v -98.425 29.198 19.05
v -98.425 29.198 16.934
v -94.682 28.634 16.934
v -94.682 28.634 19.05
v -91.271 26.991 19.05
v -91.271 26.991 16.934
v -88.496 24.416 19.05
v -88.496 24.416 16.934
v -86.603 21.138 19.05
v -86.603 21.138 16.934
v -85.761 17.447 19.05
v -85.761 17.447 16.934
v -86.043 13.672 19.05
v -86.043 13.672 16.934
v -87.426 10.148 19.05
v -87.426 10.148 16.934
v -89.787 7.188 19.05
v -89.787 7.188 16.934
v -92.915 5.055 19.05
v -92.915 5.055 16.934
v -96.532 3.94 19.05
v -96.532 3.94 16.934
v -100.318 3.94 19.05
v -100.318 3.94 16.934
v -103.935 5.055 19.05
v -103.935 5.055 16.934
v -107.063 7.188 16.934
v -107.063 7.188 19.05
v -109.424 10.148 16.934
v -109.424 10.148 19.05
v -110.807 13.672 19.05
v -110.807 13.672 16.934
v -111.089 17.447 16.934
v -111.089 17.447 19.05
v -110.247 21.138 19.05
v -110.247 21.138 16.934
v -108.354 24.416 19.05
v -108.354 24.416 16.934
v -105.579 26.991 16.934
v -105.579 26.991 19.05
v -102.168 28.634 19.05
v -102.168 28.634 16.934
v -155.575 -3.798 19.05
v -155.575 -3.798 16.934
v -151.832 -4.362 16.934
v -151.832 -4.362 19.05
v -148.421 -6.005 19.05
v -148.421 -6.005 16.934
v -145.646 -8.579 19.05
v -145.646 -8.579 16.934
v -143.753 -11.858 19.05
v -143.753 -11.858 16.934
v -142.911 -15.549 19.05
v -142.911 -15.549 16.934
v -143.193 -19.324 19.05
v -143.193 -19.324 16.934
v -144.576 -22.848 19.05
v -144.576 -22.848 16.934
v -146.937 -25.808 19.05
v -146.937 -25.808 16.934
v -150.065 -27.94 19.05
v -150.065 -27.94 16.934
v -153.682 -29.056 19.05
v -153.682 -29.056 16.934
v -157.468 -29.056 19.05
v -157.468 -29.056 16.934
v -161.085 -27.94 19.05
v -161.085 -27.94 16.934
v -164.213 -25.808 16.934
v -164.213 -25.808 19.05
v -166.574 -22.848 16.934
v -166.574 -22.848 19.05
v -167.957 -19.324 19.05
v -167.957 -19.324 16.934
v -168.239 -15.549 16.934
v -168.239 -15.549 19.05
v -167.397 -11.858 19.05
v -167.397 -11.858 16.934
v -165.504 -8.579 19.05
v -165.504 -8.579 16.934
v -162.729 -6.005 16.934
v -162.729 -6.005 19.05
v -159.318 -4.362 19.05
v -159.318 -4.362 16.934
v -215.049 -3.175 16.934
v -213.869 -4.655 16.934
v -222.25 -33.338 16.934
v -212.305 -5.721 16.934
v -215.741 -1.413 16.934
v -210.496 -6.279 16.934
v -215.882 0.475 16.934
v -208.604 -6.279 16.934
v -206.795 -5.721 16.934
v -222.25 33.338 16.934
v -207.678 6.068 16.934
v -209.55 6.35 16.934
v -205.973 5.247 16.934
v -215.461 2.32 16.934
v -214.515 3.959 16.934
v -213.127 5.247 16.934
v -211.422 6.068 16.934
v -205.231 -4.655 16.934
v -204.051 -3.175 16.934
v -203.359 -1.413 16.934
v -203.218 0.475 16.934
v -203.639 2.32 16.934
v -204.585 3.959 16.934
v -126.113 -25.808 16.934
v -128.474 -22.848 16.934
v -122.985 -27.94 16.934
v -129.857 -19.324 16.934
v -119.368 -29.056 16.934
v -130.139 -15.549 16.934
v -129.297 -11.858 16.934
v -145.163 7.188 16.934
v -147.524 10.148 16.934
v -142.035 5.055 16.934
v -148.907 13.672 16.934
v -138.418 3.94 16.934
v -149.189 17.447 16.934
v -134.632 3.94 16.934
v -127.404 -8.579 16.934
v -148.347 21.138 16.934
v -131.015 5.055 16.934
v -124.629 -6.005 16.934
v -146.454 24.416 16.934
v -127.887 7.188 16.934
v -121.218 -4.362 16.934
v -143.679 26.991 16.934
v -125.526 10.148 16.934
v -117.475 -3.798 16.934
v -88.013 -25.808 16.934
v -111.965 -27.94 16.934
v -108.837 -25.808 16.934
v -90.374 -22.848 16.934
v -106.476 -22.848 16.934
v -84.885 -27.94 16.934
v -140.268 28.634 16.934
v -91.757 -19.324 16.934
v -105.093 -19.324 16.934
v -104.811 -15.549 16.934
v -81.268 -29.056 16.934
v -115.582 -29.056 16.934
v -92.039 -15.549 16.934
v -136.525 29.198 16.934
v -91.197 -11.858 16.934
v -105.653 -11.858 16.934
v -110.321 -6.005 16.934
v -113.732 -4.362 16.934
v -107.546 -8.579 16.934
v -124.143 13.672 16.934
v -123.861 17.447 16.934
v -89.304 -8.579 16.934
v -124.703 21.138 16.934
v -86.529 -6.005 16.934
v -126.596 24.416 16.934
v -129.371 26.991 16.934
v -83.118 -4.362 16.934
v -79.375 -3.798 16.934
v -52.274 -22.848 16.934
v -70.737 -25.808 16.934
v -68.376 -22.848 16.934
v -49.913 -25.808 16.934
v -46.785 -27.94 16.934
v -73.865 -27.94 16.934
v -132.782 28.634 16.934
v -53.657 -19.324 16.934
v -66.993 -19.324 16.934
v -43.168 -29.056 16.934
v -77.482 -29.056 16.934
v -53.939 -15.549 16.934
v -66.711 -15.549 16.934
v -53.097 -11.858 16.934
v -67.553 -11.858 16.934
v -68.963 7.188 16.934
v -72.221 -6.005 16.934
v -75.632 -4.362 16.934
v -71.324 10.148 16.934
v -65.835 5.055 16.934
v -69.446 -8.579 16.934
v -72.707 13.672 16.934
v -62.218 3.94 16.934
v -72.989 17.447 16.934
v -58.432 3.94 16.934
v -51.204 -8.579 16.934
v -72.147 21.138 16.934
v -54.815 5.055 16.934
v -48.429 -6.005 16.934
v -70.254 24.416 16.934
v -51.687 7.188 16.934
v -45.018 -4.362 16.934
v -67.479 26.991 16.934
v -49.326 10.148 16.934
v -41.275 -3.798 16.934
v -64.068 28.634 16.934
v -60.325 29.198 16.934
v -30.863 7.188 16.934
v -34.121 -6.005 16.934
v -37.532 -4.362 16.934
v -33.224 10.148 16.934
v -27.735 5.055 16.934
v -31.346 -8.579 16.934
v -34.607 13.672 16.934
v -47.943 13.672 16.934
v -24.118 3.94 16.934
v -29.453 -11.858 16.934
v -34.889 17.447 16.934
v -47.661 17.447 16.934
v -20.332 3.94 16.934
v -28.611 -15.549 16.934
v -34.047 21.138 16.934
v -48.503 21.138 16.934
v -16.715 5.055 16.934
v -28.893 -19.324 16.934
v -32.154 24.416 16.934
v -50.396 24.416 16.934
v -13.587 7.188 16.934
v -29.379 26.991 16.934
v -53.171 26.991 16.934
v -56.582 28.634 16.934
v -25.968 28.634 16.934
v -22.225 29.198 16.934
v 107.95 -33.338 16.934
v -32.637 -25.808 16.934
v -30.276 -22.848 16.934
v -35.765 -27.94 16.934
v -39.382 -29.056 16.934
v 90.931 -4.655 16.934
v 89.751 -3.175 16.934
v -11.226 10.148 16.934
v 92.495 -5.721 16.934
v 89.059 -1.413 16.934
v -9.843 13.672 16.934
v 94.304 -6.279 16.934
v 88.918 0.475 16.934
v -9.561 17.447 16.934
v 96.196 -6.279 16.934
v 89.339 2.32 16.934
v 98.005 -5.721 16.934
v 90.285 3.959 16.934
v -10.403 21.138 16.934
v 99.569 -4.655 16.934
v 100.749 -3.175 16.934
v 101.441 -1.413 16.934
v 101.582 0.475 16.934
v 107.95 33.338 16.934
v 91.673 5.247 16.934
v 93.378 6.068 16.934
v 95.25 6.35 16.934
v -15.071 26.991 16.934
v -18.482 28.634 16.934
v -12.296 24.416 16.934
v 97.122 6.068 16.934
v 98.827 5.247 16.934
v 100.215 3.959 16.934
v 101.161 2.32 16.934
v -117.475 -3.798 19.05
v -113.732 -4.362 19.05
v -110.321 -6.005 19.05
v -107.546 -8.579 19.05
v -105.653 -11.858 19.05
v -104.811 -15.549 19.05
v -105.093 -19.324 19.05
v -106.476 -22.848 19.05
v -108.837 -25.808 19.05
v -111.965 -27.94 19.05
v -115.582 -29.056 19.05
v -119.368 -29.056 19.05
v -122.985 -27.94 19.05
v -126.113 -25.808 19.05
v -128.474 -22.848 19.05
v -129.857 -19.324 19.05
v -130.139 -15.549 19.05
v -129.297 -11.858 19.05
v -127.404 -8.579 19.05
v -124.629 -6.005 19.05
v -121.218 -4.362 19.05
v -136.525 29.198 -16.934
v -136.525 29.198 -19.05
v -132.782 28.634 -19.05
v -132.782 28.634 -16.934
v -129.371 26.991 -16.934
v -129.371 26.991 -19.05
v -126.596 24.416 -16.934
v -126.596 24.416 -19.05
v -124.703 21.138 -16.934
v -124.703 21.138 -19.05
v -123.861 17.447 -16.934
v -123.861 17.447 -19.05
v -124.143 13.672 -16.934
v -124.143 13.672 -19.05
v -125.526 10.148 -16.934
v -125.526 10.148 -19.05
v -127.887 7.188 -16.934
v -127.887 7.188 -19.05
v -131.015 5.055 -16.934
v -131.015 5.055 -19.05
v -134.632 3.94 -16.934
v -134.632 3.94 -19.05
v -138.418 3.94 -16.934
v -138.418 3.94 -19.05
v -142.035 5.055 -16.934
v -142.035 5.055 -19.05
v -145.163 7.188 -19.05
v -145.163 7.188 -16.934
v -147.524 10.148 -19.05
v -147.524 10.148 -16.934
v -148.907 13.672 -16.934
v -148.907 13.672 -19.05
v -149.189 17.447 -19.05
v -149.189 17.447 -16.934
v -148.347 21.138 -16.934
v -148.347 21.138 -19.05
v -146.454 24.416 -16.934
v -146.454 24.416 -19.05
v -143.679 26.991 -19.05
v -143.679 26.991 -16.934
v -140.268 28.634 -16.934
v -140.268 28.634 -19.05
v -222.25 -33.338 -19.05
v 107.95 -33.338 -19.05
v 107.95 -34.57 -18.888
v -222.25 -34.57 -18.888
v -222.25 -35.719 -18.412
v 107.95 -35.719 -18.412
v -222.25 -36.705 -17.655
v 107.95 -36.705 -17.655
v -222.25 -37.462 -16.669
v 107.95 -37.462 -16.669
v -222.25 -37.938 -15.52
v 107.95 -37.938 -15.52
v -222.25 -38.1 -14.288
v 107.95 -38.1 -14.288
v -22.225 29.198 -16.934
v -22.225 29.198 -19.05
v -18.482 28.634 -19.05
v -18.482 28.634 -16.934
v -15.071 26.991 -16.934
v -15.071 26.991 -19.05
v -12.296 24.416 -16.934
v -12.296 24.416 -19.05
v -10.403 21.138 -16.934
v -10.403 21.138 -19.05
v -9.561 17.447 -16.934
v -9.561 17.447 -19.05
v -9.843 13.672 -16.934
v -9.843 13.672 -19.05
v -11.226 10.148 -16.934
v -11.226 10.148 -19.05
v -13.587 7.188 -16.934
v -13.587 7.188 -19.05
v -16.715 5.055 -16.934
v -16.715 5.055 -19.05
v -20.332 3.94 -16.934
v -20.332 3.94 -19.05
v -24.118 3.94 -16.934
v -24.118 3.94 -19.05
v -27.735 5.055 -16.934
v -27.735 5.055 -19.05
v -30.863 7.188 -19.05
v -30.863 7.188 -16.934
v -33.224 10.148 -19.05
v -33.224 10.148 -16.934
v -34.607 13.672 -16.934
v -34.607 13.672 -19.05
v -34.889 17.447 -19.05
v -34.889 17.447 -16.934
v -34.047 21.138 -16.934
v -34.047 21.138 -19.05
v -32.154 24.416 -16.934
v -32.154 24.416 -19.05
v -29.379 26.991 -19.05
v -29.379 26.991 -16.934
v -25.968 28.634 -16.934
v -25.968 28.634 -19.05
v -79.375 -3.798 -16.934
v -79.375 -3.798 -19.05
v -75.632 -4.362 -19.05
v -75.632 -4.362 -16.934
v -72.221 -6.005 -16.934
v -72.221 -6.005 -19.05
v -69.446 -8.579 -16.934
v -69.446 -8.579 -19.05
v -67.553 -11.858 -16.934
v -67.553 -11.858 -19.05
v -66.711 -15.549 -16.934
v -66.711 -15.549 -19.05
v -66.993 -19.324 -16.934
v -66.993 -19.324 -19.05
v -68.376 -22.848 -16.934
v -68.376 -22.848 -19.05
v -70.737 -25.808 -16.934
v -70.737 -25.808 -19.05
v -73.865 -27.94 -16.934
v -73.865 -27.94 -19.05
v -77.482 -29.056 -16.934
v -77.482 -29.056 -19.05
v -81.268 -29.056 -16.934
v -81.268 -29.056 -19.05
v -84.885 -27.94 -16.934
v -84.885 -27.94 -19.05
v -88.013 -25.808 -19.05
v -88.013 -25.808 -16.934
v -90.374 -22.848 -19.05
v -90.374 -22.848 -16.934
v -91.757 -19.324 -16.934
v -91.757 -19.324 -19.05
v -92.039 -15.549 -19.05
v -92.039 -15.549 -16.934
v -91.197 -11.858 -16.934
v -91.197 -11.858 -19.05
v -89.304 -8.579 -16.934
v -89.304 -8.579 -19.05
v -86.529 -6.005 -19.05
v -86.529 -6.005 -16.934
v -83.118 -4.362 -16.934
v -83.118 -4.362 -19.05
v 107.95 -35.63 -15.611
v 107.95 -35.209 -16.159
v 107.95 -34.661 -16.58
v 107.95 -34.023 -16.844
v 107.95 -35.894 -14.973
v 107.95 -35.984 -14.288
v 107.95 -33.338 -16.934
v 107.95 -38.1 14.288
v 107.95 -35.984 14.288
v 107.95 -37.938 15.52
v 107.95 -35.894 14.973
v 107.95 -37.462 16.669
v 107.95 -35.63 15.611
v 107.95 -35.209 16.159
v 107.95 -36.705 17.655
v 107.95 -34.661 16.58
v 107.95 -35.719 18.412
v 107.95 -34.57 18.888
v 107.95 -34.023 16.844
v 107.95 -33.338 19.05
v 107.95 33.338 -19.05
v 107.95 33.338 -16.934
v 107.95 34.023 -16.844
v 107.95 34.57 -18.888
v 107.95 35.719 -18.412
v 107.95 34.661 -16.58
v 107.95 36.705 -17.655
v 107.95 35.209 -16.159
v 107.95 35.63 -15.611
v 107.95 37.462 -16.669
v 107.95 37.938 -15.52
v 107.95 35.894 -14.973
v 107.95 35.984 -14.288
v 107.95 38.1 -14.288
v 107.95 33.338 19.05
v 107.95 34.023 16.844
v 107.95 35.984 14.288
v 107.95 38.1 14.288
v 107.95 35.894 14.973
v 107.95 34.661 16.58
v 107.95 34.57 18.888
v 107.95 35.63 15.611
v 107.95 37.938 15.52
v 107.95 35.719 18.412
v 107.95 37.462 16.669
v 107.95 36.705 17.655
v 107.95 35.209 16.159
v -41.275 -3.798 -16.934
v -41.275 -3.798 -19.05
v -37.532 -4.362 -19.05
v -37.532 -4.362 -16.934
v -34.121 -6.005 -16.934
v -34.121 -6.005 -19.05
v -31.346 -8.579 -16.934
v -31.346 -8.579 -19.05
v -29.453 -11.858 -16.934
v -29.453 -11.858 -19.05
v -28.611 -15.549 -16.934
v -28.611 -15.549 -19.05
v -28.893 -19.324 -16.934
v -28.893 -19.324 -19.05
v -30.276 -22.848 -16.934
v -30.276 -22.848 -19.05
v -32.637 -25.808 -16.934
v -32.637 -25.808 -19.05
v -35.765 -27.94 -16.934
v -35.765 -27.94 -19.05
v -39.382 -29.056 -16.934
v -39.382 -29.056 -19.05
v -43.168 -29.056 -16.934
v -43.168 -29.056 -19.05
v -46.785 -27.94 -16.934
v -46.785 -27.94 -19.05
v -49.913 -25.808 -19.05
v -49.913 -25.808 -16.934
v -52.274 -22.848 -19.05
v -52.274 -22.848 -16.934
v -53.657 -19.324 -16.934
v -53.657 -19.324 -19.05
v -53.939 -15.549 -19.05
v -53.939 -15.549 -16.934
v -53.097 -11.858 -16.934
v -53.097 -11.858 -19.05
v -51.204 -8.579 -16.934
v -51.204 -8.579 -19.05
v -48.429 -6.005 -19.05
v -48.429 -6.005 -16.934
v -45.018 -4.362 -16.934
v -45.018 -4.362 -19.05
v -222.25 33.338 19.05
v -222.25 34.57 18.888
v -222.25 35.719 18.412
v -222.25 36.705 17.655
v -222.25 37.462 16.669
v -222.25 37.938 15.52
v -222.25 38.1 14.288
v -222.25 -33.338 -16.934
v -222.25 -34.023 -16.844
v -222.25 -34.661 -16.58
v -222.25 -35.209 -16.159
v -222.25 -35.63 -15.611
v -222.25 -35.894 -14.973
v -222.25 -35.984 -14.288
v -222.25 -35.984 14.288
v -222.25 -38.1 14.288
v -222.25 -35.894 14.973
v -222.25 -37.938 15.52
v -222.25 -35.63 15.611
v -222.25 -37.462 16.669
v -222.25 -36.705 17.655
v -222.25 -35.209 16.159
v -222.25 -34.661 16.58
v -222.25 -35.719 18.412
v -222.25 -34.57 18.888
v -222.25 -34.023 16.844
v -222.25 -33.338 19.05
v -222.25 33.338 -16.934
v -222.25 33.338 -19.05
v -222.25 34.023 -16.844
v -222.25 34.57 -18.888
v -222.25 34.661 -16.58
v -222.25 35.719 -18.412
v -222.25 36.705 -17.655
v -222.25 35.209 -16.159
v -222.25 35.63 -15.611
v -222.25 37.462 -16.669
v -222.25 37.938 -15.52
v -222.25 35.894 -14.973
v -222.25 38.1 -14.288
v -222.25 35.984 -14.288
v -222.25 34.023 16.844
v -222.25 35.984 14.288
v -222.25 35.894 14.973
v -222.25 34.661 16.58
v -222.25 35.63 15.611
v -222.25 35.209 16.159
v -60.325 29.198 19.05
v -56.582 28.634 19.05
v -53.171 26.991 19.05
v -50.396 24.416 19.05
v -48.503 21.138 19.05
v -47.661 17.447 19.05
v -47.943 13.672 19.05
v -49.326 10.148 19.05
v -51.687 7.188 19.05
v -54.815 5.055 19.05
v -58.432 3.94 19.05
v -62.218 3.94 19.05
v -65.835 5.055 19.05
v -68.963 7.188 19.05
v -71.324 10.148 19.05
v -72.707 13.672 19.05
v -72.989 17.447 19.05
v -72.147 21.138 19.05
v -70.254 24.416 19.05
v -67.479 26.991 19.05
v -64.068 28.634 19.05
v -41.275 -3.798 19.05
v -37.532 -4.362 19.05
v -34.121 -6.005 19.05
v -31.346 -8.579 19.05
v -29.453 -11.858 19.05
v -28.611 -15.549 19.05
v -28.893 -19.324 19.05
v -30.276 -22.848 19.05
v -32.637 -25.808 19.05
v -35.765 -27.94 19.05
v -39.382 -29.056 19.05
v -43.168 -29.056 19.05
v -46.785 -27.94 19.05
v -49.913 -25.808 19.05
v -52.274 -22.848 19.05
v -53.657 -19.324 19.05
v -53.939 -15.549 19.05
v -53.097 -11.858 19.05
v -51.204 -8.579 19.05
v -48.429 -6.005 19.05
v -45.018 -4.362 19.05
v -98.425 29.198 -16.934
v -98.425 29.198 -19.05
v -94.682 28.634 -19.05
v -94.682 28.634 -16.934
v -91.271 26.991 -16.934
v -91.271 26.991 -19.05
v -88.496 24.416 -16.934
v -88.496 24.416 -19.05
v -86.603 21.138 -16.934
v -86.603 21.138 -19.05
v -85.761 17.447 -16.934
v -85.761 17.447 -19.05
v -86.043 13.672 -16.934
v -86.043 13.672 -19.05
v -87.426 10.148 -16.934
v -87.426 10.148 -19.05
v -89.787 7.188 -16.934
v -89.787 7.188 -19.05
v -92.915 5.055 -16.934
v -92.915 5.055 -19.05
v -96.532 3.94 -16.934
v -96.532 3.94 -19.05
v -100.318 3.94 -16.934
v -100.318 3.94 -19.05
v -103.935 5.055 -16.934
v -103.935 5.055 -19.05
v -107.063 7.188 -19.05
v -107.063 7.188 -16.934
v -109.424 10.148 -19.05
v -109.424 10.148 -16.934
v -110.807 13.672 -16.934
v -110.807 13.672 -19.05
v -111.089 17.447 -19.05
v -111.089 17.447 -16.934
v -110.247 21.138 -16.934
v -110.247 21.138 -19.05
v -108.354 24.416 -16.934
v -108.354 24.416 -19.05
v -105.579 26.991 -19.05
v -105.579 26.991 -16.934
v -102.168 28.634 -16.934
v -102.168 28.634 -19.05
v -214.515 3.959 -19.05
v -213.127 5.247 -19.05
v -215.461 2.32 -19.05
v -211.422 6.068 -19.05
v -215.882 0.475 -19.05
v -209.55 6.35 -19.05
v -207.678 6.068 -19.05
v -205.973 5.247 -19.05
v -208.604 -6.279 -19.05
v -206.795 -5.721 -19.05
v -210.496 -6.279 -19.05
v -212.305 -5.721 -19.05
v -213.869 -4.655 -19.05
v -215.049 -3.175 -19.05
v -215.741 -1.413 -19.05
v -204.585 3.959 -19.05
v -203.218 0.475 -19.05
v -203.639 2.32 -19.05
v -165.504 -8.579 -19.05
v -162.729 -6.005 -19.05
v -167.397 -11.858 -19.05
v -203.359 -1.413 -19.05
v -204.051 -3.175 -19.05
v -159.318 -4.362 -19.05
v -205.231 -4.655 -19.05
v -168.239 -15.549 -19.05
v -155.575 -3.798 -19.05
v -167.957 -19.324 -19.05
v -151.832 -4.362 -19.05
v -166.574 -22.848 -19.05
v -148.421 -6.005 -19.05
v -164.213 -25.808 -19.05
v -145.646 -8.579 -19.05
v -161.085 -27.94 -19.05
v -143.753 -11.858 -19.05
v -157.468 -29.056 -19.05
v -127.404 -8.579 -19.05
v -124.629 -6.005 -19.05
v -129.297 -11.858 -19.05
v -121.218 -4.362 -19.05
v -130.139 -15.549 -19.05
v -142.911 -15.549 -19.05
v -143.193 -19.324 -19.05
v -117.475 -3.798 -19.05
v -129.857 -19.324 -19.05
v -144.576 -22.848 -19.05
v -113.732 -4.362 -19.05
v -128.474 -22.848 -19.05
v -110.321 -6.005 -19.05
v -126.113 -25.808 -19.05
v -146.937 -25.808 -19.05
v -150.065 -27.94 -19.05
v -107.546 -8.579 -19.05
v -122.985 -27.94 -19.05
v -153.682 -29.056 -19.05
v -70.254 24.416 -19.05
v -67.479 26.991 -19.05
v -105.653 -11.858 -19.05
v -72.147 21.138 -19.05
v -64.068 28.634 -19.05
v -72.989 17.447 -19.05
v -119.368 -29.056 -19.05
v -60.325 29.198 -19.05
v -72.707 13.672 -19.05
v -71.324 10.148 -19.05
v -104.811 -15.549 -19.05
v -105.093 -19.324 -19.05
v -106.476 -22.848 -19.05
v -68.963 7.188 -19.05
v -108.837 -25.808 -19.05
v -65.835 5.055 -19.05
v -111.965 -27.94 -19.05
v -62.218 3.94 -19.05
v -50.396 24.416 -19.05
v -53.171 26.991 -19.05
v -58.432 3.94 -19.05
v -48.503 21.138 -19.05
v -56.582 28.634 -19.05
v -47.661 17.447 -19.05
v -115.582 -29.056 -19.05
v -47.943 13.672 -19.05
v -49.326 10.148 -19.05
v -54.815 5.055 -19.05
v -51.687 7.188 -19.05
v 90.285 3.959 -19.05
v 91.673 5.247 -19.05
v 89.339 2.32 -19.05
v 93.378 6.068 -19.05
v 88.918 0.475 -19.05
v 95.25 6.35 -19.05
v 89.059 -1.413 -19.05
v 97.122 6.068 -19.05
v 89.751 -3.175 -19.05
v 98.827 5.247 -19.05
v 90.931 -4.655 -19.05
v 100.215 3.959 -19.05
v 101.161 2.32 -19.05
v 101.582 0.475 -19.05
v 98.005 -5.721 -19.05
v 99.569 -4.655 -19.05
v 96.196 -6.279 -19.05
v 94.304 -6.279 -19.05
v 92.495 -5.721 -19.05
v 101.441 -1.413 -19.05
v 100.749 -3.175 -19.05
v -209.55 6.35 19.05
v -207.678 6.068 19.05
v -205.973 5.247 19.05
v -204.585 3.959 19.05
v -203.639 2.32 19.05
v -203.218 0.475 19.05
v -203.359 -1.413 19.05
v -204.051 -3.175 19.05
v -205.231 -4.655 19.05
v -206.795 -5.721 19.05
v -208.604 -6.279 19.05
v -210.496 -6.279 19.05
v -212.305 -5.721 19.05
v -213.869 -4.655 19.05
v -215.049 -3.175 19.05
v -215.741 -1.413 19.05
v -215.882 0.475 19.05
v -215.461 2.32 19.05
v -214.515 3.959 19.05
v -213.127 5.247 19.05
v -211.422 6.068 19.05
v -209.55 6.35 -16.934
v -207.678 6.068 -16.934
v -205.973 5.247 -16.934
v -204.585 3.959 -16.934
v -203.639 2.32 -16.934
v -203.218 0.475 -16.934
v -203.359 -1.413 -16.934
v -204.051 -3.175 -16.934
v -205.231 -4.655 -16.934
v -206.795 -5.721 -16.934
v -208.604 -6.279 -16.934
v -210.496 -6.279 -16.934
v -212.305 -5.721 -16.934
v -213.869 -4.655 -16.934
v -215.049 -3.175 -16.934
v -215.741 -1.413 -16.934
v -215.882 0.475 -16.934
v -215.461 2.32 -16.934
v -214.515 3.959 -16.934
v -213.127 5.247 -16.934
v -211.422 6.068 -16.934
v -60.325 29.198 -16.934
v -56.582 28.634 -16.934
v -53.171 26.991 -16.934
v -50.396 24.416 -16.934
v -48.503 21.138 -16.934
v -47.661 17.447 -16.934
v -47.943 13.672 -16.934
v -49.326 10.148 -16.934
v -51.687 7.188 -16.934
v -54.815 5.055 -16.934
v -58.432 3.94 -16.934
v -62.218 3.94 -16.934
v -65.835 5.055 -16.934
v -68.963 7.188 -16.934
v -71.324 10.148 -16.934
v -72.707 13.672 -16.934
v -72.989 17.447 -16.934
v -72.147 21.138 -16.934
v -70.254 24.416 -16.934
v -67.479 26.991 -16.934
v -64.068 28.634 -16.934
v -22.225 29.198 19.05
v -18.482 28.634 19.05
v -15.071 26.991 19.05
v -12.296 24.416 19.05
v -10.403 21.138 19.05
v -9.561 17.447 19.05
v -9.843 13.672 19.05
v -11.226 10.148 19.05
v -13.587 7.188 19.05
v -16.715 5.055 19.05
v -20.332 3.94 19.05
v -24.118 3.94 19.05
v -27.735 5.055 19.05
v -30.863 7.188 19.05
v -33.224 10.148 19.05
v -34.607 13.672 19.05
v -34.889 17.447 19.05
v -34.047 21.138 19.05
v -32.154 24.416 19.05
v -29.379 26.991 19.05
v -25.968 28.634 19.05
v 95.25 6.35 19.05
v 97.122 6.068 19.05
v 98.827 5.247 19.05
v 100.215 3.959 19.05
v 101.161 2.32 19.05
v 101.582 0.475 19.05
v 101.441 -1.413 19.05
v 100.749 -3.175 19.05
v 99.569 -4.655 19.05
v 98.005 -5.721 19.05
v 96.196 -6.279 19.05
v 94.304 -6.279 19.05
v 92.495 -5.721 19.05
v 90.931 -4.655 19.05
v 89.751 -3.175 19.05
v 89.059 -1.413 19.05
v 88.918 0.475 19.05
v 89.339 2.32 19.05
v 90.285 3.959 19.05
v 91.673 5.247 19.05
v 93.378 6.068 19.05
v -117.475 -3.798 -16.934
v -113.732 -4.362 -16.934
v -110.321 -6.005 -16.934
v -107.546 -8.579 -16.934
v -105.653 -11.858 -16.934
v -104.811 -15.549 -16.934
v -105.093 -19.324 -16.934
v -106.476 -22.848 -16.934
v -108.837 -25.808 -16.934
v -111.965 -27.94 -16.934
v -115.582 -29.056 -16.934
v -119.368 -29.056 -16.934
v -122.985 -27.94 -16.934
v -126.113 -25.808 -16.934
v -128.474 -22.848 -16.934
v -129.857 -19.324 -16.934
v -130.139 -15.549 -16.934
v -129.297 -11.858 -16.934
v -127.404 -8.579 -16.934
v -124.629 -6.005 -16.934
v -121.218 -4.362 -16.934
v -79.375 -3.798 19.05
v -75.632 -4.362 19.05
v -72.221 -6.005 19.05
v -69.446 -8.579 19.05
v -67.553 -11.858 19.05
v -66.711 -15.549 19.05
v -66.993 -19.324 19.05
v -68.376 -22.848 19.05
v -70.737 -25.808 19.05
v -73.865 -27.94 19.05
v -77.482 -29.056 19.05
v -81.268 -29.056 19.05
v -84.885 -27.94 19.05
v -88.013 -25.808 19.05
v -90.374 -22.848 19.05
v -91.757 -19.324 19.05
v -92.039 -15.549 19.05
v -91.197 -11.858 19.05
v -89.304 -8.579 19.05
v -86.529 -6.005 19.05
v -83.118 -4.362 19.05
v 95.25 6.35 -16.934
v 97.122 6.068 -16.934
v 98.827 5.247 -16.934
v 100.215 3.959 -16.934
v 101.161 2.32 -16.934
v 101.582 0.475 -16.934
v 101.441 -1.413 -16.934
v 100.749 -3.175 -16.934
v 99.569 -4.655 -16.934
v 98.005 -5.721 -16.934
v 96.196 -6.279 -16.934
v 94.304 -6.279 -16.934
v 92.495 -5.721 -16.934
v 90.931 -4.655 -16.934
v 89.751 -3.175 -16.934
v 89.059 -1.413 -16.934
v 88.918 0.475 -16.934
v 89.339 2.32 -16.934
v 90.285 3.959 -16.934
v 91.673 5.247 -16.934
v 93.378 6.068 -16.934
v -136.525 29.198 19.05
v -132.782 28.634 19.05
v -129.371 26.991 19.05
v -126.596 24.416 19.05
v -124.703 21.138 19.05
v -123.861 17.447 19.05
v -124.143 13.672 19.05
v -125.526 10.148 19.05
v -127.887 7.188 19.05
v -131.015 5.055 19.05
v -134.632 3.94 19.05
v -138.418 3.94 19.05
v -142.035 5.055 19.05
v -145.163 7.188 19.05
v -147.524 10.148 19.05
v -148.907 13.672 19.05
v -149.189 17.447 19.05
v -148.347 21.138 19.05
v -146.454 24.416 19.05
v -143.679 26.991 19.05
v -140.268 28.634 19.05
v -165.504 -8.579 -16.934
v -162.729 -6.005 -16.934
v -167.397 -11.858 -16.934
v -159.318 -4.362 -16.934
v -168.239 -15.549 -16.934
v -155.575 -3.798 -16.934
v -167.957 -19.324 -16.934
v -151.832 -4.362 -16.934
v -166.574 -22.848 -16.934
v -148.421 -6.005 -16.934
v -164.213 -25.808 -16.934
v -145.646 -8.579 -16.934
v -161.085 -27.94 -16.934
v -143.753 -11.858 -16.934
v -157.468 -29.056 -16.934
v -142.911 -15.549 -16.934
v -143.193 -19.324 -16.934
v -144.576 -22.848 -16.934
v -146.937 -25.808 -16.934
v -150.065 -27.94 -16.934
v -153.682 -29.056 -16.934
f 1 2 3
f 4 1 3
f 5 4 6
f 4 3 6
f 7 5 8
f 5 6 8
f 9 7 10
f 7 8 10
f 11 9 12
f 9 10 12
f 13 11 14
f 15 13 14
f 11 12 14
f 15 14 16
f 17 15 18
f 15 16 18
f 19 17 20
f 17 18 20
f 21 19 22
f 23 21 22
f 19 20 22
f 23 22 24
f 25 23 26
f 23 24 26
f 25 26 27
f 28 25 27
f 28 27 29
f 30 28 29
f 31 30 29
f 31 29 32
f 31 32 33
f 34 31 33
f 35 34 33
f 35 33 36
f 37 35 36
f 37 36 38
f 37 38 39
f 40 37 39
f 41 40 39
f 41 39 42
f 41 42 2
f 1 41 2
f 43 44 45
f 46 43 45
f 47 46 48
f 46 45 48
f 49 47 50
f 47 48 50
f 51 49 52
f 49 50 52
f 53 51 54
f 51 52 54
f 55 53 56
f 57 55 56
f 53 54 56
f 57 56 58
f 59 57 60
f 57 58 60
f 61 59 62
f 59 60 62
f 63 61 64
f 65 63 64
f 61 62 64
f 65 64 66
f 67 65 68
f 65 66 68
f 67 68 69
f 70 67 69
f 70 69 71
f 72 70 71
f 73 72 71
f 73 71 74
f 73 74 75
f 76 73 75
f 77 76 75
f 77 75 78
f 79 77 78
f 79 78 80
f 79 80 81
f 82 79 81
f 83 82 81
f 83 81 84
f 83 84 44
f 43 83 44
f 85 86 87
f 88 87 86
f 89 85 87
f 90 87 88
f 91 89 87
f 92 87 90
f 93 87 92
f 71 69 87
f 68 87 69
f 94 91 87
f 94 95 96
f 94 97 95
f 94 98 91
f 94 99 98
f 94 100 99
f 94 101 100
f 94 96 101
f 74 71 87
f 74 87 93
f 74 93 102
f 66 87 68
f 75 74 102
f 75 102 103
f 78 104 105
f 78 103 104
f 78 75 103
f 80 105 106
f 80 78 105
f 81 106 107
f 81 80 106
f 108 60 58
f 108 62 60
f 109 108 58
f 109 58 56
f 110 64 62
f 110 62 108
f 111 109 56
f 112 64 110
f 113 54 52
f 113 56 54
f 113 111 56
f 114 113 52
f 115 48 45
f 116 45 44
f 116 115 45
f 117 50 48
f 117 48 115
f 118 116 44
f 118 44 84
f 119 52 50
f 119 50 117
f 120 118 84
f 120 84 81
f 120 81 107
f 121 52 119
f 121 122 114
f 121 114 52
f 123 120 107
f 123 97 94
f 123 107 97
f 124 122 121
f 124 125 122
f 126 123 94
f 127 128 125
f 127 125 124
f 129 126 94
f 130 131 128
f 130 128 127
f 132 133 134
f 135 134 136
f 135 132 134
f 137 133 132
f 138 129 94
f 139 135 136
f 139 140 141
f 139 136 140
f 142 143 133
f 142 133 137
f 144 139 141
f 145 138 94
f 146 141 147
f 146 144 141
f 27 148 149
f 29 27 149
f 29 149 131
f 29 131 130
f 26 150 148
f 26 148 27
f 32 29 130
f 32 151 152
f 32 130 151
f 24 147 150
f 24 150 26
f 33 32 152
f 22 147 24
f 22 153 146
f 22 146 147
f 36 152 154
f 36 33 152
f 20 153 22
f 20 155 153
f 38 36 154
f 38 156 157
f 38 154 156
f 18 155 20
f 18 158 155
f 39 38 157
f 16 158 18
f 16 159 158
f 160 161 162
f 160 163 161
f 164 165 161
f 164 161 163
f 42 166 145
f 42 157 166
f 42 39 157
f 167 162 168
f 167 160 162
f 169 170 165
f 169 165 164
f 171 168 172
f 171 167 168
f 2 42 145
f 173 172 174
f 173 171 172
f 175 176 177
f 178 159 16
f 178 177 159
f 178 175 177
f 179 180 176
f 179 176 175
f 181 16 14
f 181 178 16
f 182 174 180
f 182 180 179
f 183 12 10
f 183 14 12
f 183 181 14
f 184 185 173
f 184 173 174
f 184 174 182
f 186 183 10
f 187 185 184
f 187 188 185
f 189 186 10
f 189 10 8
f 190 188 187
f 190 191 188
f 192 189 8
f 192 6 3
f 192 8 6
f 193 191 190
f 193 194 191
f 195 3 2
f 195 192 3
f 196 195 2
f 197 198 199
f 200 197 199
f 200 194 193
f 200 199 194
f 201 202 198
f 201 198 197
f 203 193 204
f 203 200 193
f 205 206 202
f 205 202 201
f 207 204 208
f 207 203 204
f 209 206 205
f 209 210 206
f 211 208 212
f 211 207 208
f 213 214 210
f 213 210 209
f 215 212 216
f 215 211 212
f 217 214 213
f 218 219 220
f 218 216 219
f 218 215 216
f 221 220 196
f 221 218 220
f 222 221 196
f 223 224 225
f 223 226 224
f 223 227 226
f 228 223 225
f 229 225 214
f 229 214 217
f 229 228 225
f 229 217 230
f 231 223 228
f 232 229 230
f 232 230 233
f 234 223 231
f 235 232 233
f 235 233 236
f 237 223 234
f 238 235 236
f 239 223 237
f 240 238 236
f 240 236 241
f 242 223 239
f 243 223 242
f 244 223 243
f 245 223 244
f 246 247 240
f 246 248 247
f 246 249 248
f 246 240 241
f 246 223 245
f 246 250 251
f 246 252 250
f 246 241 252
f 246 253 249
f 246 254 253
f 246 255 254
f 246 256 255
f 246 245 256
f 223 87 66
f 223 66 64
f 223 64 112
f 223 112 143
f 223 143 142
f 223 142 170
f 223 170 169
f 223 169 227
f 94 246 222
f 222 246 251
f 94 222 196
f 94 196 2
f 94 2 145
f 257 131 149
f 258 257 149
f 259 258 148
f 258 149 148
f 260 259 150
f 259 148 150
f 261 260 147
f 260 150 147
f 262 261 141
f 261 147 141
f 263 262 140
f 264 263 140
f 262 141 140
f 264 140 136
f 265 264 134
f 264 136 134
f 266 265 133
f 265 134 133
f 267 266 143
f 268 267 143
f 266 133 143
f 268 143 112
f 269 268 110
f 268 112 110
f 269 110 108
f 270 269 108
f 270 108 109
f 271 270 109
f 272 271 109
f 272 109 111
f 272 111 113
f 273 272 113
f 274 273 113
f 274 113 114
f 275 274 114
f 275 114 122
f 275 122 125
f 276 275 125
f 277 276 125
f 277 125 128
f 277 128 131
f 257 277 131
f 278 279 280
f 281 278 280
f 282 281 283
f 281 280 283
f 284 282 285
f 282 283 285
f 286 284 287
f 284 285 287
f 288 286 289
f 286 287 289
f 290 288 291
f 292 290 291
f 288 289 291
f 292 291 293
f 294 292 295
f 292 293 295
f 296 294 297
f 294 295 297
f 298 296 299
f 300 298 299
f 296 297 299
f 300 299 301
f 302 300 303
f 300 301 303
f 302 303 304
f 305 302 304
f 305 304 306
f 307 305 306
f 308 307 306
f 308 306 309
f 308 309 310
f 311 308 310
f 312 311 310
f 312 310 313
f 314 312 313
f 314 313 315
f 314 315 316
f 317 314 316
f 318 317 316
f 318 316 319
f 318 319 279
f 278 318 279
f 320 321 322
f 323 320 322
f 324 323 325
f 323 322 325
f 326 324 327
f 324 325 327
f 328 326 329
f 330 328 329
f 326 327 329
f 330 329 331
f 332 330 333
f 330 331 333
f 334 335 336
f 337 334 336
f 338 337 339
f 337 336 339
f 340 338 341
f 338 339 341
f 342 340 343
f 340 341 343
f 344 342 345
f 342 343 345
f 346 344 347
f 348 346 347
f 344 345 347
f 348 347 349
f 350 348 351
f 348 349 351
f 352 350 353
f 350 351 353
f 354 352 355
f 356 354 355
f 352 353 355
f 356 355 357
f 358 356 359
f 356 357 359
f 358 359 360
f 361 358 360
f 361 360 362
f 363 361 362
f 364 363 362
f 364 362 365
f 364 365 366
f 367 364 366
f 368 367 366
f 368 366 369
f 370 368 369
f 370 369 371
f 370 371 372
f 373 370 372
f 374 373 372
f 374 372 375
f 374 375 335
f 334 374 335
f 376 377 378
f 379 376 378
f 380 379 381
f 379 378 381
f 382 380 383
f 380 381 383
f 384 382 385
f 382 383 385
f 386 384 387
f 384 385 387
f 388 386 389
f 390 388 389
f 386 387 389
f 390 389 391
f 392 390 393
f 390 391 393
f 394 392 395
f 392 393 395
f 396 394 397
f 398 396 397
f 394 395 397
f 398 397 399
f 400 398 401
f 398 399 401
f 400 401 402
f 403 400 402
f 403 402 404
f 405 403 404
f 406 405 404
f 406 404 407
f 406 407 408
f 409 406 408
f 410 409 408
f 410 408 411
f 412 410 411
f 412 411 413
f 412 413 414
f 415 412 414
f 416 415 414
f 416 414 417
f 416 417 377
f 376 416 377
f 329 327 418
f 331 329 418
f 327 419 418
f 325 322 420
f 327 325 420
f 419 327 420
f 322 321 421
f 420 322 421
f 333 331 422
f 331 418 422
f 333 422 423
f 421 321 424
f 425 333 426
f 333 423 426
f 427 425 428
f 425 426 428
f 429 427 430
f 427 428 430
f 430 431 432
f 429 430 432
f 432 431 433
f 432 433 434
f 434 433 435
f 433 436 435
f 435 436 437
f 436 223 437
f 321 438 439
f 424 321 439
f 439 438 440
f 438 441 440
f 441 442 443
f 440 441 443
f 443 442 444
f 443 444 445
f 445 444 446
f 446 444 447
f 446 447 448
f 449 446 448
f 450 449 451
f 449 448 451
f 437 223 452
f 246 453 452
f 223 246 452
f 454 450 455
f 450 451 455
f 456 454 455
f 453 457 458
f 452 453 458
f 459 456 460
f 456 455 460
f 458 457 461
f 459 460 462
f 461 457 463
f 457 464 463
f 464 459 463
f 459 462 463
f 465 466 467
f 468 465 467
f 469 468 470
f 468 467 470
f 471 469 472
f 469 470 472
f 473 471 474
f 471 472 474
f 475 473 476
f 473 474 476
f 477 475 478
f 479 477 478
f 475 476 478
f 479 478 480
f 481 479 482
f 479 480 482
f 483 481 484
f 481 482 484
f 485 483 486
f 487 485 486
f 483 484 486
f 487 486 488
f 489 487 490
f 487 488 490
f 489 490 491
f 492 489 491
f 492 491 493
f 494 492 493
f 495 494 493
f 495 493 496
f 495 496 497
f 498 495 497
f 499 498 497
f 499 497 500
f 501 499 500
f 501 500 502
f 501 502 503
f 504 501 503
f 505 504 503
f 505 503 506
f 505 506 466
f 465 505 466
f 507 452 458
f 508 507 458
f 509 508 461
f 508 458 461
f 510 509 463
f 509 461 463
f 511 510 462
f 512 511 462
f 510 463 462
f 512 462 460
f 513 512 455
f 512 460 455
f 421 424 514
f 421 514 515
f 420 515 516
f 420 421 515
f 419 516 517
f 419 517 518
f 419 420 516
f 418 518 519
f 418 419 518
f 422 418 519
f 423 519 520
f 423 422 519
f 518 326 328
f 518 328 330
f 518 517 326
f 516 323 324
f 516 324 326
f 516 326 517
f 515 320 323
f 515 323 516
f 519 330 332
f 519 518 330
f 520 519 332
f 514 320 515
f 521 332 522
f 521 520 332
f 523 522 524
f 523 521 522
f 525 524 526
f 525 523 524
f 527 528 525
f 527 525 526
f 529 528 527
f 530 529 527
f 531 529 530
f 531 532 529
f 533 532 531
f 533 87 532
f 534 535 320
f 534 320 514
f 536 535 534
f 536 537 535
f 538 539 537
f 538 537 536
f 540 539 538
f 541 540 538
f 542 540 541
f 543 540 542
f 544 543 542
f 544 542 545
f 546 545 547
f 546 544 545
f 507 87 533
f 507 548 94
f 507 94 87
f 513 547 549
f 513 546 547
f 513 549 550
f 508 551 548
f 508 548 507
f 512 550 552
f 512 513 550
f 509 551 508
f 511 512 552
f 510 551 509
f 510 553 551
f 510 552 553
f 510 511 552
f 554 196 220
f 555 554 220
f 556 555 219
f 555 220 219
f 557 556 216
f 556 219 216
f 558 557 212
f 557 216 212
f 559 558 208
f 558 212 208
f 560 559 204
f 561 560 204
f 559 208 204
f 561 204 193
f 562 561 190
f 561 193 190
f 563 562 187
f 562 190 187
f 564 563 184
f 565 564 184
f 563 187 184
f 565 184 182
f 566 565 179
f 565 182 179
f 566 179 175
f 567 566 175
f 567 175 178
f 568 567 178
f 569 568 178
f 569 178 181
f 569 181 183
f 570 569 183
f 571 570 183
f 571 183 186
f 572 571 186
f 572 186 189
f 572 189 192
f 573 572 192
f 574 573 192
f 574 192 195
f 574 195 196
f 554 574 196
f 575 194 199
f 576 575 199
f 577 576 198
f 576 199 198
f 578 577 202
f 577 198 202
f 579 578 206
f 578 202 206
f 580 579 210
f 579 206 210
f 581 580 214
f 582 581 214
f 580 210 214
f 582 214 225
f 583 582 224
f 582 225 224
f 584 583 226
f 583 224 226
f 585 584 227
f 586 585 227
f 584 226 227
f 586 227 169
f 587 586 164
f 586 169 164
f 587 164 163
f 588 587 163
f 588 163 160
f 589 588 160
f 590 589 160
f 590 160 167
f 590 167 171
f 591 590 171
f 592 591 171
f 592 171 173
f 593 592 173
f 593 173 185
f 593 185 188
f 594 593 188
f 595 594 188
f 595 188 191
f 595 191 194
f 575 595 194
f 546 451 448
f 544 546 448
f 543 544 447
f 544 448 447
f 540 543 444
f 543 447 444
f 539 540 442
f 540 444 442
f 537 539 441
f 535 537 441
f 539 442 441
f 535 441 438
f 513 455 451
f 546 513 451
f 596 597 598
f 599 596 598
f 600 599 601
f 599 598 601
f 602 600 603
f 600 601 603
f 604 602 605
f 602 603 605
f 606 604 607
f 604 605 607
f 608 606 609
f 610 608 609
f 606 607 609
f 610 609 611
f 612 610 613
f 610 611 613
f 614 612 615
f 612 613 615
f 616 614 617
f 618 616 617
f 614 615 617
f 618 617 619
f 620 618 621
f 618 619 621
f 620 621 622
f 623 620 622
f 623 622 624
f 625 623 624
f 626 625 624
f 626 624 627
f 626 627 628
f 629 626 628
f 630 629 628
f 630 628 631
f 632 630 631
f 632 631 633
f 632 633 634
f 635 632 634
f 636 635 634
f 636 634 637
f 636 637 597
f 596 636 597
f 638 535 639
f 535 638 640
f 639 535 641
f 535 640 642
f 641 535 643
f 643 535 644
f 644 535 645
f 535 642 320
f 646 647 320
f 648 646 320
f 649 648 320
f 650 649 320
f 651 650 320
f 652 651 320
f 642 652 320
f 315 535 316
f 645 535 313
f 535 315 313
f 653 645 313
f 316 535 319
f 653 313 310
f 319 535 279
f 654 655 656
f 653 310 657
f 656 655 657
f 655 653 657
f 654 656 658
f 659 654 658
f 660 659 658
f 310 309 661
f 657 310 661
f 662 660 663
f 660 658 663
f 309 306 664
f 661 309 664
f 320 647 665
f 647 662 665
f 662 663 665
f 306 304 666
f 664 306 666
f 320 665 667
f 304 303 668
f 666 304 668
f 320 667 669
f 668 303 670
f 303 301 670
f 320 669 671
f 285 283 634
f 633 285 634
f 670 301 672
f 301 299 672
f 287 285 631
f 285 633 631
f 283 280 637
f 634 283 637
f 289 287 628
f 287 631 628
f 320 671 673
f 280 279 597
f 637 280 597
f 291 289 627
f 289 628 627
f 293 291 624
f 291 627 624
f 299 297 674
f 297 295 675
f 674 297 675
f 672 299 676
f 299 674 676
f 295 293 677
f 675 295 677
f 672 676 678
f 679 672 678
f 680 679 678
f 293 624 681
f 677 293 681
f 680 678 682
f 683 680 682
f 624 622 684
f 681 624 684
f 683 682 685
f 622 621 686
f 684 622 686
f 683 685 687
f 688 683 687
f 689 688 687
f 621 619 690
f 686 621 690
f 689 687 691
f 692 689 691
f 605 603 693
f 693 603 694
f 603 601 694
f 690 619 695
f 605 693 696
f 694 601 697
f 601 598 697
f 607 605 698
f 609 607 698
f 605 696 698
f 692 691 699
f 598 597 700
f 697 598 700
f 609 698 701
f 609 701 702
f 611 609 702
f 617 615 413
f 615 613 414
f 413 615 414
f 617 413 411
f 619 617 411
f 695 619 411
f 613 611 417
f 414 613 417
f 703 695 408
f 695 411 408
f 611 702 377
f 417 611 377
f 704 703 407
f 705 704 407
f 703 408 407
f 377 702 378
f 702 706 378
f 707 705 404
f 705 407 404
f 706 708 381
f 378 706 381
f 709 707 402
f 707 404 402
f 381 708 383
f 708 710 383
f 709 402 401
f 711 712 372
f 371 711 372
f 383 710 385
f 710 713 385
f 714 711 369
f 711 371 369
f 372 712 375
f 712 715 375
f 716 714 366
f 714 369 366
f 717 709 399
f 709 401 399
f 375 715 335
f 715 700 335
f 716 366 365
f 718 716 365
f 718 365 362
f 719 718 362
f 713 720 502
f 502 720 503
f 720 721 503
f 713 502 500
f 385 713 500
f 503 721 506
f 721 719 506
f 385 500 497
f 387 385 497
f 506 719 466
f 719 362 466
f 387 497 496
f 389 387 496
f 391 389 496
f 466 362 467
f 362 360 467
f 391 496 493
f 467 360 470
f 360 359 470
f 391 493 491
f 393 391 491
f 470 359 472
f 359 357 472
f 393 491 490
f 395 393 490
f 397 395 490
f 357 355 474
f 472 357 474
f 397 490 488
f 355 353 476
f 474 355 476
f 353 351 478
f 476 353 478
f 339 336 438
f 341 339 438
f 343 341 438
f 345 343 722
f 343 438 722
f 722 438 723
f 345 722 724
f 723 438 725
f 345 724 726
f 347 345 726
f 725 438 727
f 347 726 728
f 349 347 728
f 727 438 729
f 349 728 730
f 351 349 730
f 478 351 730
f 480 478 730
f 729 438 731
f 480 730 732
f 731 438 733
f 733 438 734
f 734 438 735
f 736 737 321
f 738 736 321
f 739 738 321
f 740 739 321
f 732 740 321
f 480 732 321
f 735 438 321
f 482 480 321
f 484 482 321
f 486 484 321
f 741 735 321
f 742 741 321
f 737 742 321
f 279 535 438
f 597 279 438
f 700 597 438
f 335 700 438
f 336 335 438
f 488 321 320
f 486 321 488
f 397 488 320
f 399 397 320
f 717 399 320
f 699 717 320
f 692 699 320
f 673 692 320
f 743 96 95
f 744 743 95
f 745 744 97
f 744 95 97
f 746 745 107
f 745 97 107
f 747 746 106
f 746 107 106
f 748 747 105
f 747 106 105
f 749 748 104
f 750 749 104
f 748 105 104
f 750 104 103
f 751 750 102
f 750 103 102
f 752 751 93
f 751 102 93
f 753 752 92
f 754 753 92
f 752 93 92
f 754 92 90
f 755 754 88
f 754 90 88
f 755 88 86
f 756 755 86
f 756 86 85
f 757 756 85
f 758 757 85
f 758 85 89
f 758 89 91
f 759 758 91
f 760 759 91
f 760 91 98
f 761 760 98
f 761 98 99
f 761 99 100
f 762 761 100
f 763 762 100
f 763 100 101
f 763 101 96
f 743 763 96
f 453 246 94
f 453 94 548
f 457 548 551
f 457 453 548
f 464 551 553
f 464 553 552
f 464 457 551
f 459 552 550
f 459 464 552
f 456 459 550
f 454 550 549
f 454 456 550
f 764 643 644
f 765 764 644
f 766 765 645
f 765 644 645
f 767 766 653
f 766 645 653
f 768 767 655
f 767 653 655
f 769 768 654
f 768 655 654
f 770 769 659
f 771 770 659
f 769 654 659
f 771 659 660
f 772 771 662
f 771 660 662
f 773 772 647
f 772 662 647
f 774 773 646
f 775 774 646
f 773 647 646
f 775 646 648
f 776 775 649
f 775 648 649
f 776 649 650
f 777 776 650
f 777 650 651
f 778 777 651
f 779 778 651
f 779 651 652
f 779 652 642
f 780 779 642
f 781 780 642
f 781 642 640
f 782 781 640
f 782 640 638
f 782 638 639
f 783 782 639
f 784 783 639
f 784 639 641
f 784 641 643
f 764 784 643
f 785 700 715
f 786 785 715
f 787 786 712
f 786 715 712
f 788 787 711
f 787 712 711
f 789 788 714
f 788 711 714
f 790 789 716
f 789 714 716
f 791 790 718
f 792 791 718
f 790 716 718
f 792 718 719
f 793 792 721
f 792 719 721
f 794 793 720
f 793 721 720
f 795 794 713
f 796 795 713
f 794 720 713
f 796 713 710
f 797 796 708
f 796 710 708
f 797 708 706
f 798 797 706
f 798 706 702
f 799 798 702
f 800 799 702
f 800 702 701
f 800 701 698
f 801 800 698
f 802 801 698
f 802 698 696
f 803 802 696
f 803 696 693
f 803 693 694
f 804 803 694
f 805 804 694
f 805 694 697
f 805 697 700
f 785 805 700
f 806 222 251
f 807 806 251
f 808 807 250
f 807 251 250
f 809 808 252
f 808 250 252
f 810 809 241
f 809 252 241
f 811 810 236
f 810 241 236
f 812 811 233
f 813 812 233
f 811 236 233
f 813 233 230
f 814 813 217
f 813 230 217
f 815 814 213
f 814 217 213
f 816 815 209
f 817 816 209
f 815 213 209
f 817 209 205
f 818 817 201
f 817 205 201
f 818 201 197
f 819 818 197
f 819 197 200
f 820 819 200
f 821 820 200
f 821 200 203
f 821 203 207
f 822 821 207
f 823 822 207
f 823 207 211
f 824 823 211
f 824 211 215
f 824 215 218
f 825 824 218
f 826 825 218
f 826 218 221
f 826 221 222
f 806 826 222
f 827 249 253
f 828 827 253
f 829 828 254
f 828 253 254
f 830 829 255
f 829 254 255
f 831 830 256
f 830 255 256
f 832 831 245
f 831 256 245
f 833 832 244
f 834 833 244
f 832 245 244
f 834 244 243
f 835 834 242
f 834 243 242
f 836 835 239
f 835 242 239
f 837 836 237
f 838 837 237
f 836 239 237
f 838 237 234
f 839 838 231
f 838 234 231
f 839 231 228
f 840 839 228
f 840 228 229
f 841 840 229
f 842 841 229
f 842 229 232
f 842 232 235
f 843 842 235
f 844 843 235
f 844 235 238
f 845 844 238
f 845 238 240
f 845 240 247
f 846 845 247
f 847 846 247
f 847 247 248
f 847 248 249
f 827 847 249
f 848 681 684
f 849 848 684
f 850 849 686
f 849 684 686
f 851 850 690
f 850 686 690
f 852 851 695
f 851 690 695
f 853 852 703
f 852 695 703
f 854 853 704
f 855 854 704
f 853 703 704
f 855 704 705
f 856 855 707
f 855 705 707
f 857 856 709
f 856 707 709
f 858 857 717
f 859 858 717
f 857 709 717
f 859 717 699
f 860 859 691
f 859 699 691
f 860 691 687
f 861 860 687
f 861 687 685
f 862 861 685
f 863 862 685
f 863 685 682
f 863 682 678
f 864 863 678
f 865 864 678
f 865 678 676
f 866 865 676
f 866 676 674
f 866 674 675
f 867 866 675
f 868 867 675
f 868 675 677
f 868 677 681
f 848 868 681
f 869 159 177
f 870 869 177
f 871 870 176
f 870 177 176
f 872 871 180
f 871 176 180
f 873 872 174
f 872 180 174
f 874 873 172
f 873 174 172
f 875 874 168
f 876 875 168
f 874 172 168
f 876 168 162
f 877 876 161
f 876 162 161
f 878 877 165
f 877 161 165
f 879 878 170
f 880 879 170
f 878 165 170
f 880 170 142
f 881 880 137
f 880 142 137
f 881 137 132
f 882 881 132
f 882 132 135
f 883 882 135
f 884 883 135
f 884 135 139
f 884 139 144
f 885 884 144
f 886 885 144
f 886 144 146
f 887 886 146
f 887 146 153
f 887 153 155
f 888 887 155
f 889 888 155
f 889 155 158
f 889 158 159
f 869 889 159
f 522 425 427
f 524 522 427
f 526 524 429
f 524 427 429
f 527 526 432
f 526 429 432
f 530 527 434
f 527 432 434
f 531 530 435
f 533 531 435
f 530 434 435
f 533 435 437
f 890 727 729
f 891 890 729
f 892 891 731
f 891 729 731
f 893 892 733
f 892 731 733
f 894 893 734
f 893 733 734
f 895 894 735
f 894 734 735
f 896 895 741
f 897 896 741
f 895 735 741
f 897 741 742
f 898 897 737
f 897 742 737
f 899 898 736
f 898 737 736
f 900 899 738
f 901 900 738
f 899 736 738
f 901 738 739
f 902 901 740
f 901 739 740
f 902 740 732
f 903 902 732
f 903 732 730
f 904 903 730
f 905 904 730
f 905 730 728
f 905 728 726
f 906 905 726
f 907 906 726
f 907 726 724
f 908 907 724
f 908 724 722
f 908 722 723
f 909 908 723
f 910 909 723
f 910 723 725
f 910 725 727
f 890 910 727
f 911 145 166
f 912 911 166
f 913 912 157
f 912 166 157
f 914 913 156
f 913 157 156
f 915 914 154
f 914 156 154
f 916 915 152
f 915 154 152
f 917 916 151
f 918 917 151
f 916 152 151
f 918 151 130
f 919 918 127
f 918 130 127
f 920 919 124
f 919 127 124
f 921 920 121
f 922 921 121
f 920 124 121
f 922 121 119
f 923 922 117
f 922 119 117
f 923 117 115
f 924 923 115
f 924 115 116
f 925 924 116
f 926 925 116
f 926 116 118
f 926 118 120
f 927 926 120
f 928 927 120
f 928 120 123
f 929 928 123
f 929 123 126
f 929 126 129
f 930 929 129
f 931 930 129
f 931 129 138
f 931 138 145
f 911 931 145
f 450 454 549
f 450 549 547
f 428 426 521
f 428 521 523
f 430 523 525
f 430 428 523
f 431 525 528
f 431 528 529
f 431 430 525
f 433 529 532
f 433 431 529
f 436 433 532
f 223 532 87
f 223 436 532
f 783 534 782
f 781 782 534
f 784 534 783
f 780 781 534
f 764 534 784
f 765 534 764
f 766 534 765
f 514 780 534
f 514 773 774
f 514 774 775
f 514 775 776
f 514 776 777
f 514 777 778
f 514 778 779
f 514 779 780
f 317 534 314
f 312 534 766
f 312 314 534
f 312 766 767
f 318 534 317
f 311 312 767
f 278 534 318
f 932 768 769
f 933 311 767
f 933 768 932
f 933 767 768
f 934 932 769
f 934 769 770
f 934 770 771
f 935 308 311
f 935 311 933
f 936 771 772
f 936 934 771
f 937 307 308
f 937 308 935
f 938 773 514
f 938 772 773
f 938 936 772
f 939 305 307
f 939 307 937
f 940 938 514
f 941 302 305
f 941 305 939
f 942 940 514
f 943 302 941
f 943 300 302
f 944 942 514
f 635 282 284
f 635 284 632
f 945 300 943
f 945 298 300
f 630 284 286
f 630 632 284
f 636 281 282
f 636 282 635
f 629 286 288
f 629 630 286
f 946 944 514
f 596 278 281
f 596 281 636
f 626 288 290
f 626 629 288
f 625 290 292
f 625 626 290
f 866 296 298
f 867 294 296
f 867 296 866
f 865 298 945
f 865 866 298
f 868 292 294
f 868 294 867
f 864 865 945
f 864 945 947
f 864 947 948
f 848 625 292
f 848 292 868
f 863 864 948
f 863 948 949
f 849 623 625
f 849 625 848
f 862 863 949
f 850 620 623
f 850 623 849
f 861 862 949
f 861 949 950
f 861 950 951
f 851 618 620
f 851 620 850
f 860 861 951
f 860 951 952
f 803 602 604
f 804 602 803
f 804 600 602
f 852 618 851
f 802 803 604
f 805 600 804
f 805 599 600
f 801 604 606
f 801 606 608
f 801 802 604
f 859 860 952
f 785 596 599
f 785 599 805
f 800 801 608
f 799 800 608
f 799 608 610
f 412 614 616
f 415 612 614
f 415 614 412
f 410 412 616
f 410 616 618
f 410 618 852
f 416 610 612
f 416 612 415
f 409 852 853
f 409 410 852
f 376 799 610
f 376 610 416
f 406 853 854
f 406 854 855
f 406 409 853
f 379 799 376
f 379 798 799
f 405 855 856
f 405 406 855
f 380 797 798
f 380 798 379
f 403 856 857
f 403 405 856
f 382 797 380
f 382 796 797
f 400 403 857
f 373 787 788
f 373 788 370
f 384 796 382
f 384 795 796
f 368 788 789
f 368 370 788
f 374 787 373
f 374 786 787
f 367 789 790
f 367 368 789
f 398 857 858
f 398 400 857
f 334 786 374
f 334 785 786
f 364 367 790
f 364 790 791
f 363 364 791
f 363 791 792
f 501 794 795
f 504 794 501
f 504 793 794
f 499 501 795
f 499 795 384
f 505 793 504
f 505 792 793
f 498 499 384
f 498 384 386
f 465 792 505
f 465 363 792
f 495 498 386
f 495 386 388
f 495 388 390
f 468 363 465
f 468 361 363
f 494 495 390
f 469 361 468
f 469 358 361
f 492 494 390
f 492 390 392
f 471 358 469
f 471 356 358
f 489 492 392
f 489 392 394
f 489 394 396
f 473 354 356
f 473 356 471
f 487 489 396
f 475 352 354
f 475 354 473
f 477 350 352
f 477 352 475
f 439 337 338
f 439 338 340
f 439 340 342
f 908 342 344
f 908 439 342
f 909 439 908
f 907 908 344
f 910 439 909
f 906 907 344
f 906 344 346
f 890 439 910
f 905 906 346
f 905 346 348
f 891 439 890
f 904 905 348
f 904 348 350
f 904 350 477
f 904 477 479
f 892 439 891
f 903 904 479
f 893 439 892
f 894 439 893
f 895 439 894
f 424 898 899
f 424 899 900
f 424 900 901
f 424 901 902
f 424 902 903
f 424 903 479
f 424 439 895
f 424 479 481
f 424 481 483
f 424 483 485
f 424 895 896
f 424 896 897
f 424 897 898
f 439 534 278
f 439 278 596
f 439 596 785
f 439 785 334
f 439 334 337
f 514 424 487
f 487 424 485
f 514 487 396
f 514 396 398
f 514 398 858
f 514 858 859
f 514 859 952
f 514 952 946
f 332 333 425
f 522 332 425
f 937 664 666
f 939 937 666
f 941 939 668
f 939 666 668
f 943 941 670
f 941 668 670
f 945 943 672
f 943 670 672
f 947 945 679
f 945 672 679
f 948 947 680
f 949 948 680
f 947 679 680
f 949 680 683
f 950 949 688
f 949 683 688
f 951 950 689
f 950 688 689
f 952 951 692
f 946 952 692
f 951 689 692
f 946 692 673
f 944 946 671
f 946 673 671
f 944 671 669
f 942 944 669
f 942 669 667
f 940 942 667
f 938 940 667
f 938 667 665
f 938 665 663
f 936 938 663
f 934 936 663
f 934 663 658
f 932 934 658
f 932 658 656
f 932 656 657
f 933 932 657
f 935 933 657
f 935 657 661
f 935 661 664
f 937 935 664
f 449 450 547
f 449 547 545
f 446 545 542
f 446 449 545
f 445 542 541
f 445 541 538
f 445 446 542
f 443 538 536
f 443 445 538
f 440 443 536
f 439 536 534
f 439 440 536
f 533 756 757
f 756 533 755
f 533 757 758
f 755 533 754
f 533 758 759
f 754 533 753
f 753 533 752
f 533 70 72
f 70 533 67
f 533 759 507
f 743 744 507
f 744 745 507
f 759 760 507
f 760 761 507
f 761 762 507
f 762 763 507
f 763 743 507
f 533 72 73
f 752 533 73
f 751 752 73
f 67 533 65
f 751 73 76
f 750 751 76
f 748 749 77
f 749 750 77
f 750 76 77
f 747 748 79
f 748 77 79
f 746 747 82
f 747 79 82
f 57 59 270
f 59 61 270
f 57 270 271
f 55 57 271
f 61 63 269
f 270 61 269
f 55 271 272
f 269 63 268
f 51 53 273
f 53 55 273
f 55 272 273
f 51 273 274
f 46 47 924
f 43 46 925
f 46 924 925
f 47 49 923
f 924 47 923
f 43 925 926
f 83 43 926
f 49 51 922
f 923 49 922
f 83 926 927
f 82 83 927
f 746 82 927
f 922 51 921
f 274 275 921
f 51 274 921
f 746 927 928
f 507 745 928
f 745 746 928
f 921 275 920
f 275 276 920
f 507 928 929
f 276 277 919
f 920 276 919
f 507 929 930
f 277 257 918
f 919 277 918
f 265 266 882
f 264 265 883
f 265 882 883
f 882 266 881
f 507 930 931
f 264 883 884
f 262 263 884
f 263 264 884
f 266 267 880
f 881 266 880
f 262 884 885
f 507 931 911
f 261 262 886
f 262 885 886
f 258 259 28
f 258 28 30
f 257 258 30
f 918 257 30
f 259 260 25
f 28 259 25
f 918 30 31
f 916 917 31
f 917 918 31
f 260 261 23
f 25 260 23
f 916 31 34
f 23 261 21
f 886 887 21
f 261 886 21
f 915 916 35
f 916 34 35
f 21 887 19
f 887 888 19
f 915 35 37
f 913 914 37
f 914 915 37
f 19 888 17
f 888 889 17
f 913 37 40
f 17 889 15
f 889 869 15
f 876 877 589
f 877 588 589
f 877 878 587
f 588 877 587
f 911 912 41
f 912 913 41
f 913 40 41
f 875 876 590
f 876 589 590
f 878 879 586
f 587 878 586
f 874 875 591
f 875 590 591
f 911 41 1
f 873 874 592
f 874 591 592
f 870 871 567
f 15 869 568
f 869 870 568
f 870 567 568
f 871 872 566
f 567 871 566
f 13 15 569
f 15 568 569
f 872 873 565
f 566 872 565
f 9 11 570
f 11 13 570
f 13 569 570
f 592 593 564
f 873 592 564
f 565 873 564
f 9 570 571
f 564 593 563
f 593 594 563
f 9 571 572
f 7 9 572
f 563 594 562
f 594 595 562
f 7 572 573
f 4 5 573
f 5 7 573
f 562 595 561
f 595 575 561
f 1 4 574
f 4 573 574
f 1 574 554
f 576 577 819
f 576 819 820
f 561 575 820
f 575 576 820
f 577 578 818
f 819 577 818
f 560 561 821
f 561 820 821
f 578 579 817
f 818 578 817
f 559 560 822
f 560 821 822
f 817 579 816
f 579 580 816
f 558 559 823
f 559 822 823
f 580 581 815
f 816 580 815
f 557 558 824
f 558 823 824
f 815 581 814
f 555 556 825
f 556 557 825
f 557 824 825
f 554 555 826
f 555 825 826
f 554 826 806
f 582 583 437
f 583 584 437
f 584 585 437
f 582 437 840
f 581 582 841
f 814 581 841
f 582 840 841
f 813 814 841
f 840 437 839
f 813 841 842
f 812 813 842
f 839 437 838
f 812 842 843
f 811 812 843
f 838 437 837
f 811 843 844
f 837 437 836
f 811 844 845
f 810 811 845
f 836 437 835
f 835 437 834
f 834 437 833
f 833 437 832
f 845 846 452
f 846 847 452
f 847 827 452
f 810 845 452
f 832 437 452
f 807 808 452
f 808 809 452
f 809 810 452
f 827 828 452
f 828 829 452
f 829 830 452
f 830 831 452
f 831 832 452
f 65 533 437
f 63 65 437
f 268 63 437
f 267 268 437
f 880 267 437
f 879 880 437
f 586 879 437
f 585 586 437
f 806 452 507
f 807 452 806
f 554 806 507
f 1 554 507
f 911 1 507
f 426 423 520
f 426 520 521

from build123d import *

# Parameters (mm, degrees)
STRUCTURAL_MEMBER1_DEPTH = 330.2
SKETCH15_R               = 6.35
CUT_EXTRUDE1_DEPTH       = 229.688177438
SKETCH16_R               = 12.7
CUT_EXTRUDE2_DEPTH       = 229.688177438
LPATTERN1_COUNT          = 4
LPATTERN1_PITCH          = 38.1


with BuildPart() as part:
    # Sketch13 → Structural Member1 (new body)
    with BuildSketch(Plane.ZY.offset(-107.95)):
        with BuildLine():
            Line((-14.2875, -38.1), (14.2875, -38.1))
            ThreePointArc((14.2875, -38.1), (17.655096045, -36.705096045), (19.05, -33.3375))
            Line((19.05, -33.3375), (19.05, 33.3375))
            ThreePointArc((19.05, 33.3375), (17.655096045, 36.705096045), (14.2875, 38.1))
            Line((14.2875, 38.1), (-14.2875, 38.1))
            ThreePointArc((-14.2875, 38.1), (-17.655096045, 36.705096045), (-19.05, 33.3375))
            Line((-19.05, 33.3375), (-19.05, -33.3375))
            ThreePointArc((-19.05, -33.3375), (-17.655096045, -36.705096045), (-14.2875, -38.1))
        make_face()
        with BuildLine():
            Line((-14.2875, -35.98418), (14.2875, -35.98418))
            ThreePointArc((14.2875, -35.98418), (16.158985376, -35.208985376), (16.93418, -33.3375))
            Line((16.93418, -33.3375), (16.93418, 33.3375))
            ThreePointArc((16.93418, 33.3375), (16.158985376, 35.208985376), (14.2875, 35.98418))
            Line((14.2875, 35.98418), (-14.2875, 35.98418))
            ThreePointArc((-14.2875, 35.98418), (-16.158985376, 35.208985376), (-16.93418, 33.3375))
            Line((-16.93418, 33.3375), (-16.93418, -33.3375))
            ThreePointArc((-16.93418, -33.3375), (-16.158985376, -35.208985376), (-14.2875, -35.98418))
        make_face(mode=Mode.SUBTRACT)
    extrude(amount=STRUCTURAL_MEMBER1_DEPTH)

    # Sketch15 → Cut-Extrude1 (cut, through all)
    with BuildSketch(Plane(origin=(0, 0, -19.05), x_dir=(-1, 0, 0), z_dir=(0, 0, -1))):
        with Locations(Location((-95.25, 0, 0), (0, 0, 90))):
            Circle(SKETCH15_R)
        with Locations(Location((209.55, 0, 0), (0, 0, 90))):
            Circle(SKETCH15_R)
    extrude(amount=-CUT_EXTRUDE1_DEPTH, mode=Mode.SUBTRACT)

    # Sketch16 → Cut-Extrude2 (cut, through all)
    with BuildSketch(Plane(origin=(0, 0, -19.05), x_dir=(-1, 0, 0), z_dir=(0, 0, -1))):
        with Locations(Location((22.225, 16.497783942, 0), (0, 0, 90))):
            Circle(SKETCH16_R)
        with Locations(Location((41.275, -16.497783942, 0), (0, 0, 90))):
            Circle(SKETCH16_R)
    cut_extrude2 = extrude(amount=-CUT_EXTRUDE2_DEPTH, mode=Mode.SUBTRACT)

    # LPattern1: Cut-Extrude2 ×4
    with Locations(*[(-i * LPATTERN1_PITCH, 0, 0) for i in range(1, LPATTERN1_COUNT)]):
        add(cut_extrude2, mode=Mode.SUBTRACT)


solid = part.part
